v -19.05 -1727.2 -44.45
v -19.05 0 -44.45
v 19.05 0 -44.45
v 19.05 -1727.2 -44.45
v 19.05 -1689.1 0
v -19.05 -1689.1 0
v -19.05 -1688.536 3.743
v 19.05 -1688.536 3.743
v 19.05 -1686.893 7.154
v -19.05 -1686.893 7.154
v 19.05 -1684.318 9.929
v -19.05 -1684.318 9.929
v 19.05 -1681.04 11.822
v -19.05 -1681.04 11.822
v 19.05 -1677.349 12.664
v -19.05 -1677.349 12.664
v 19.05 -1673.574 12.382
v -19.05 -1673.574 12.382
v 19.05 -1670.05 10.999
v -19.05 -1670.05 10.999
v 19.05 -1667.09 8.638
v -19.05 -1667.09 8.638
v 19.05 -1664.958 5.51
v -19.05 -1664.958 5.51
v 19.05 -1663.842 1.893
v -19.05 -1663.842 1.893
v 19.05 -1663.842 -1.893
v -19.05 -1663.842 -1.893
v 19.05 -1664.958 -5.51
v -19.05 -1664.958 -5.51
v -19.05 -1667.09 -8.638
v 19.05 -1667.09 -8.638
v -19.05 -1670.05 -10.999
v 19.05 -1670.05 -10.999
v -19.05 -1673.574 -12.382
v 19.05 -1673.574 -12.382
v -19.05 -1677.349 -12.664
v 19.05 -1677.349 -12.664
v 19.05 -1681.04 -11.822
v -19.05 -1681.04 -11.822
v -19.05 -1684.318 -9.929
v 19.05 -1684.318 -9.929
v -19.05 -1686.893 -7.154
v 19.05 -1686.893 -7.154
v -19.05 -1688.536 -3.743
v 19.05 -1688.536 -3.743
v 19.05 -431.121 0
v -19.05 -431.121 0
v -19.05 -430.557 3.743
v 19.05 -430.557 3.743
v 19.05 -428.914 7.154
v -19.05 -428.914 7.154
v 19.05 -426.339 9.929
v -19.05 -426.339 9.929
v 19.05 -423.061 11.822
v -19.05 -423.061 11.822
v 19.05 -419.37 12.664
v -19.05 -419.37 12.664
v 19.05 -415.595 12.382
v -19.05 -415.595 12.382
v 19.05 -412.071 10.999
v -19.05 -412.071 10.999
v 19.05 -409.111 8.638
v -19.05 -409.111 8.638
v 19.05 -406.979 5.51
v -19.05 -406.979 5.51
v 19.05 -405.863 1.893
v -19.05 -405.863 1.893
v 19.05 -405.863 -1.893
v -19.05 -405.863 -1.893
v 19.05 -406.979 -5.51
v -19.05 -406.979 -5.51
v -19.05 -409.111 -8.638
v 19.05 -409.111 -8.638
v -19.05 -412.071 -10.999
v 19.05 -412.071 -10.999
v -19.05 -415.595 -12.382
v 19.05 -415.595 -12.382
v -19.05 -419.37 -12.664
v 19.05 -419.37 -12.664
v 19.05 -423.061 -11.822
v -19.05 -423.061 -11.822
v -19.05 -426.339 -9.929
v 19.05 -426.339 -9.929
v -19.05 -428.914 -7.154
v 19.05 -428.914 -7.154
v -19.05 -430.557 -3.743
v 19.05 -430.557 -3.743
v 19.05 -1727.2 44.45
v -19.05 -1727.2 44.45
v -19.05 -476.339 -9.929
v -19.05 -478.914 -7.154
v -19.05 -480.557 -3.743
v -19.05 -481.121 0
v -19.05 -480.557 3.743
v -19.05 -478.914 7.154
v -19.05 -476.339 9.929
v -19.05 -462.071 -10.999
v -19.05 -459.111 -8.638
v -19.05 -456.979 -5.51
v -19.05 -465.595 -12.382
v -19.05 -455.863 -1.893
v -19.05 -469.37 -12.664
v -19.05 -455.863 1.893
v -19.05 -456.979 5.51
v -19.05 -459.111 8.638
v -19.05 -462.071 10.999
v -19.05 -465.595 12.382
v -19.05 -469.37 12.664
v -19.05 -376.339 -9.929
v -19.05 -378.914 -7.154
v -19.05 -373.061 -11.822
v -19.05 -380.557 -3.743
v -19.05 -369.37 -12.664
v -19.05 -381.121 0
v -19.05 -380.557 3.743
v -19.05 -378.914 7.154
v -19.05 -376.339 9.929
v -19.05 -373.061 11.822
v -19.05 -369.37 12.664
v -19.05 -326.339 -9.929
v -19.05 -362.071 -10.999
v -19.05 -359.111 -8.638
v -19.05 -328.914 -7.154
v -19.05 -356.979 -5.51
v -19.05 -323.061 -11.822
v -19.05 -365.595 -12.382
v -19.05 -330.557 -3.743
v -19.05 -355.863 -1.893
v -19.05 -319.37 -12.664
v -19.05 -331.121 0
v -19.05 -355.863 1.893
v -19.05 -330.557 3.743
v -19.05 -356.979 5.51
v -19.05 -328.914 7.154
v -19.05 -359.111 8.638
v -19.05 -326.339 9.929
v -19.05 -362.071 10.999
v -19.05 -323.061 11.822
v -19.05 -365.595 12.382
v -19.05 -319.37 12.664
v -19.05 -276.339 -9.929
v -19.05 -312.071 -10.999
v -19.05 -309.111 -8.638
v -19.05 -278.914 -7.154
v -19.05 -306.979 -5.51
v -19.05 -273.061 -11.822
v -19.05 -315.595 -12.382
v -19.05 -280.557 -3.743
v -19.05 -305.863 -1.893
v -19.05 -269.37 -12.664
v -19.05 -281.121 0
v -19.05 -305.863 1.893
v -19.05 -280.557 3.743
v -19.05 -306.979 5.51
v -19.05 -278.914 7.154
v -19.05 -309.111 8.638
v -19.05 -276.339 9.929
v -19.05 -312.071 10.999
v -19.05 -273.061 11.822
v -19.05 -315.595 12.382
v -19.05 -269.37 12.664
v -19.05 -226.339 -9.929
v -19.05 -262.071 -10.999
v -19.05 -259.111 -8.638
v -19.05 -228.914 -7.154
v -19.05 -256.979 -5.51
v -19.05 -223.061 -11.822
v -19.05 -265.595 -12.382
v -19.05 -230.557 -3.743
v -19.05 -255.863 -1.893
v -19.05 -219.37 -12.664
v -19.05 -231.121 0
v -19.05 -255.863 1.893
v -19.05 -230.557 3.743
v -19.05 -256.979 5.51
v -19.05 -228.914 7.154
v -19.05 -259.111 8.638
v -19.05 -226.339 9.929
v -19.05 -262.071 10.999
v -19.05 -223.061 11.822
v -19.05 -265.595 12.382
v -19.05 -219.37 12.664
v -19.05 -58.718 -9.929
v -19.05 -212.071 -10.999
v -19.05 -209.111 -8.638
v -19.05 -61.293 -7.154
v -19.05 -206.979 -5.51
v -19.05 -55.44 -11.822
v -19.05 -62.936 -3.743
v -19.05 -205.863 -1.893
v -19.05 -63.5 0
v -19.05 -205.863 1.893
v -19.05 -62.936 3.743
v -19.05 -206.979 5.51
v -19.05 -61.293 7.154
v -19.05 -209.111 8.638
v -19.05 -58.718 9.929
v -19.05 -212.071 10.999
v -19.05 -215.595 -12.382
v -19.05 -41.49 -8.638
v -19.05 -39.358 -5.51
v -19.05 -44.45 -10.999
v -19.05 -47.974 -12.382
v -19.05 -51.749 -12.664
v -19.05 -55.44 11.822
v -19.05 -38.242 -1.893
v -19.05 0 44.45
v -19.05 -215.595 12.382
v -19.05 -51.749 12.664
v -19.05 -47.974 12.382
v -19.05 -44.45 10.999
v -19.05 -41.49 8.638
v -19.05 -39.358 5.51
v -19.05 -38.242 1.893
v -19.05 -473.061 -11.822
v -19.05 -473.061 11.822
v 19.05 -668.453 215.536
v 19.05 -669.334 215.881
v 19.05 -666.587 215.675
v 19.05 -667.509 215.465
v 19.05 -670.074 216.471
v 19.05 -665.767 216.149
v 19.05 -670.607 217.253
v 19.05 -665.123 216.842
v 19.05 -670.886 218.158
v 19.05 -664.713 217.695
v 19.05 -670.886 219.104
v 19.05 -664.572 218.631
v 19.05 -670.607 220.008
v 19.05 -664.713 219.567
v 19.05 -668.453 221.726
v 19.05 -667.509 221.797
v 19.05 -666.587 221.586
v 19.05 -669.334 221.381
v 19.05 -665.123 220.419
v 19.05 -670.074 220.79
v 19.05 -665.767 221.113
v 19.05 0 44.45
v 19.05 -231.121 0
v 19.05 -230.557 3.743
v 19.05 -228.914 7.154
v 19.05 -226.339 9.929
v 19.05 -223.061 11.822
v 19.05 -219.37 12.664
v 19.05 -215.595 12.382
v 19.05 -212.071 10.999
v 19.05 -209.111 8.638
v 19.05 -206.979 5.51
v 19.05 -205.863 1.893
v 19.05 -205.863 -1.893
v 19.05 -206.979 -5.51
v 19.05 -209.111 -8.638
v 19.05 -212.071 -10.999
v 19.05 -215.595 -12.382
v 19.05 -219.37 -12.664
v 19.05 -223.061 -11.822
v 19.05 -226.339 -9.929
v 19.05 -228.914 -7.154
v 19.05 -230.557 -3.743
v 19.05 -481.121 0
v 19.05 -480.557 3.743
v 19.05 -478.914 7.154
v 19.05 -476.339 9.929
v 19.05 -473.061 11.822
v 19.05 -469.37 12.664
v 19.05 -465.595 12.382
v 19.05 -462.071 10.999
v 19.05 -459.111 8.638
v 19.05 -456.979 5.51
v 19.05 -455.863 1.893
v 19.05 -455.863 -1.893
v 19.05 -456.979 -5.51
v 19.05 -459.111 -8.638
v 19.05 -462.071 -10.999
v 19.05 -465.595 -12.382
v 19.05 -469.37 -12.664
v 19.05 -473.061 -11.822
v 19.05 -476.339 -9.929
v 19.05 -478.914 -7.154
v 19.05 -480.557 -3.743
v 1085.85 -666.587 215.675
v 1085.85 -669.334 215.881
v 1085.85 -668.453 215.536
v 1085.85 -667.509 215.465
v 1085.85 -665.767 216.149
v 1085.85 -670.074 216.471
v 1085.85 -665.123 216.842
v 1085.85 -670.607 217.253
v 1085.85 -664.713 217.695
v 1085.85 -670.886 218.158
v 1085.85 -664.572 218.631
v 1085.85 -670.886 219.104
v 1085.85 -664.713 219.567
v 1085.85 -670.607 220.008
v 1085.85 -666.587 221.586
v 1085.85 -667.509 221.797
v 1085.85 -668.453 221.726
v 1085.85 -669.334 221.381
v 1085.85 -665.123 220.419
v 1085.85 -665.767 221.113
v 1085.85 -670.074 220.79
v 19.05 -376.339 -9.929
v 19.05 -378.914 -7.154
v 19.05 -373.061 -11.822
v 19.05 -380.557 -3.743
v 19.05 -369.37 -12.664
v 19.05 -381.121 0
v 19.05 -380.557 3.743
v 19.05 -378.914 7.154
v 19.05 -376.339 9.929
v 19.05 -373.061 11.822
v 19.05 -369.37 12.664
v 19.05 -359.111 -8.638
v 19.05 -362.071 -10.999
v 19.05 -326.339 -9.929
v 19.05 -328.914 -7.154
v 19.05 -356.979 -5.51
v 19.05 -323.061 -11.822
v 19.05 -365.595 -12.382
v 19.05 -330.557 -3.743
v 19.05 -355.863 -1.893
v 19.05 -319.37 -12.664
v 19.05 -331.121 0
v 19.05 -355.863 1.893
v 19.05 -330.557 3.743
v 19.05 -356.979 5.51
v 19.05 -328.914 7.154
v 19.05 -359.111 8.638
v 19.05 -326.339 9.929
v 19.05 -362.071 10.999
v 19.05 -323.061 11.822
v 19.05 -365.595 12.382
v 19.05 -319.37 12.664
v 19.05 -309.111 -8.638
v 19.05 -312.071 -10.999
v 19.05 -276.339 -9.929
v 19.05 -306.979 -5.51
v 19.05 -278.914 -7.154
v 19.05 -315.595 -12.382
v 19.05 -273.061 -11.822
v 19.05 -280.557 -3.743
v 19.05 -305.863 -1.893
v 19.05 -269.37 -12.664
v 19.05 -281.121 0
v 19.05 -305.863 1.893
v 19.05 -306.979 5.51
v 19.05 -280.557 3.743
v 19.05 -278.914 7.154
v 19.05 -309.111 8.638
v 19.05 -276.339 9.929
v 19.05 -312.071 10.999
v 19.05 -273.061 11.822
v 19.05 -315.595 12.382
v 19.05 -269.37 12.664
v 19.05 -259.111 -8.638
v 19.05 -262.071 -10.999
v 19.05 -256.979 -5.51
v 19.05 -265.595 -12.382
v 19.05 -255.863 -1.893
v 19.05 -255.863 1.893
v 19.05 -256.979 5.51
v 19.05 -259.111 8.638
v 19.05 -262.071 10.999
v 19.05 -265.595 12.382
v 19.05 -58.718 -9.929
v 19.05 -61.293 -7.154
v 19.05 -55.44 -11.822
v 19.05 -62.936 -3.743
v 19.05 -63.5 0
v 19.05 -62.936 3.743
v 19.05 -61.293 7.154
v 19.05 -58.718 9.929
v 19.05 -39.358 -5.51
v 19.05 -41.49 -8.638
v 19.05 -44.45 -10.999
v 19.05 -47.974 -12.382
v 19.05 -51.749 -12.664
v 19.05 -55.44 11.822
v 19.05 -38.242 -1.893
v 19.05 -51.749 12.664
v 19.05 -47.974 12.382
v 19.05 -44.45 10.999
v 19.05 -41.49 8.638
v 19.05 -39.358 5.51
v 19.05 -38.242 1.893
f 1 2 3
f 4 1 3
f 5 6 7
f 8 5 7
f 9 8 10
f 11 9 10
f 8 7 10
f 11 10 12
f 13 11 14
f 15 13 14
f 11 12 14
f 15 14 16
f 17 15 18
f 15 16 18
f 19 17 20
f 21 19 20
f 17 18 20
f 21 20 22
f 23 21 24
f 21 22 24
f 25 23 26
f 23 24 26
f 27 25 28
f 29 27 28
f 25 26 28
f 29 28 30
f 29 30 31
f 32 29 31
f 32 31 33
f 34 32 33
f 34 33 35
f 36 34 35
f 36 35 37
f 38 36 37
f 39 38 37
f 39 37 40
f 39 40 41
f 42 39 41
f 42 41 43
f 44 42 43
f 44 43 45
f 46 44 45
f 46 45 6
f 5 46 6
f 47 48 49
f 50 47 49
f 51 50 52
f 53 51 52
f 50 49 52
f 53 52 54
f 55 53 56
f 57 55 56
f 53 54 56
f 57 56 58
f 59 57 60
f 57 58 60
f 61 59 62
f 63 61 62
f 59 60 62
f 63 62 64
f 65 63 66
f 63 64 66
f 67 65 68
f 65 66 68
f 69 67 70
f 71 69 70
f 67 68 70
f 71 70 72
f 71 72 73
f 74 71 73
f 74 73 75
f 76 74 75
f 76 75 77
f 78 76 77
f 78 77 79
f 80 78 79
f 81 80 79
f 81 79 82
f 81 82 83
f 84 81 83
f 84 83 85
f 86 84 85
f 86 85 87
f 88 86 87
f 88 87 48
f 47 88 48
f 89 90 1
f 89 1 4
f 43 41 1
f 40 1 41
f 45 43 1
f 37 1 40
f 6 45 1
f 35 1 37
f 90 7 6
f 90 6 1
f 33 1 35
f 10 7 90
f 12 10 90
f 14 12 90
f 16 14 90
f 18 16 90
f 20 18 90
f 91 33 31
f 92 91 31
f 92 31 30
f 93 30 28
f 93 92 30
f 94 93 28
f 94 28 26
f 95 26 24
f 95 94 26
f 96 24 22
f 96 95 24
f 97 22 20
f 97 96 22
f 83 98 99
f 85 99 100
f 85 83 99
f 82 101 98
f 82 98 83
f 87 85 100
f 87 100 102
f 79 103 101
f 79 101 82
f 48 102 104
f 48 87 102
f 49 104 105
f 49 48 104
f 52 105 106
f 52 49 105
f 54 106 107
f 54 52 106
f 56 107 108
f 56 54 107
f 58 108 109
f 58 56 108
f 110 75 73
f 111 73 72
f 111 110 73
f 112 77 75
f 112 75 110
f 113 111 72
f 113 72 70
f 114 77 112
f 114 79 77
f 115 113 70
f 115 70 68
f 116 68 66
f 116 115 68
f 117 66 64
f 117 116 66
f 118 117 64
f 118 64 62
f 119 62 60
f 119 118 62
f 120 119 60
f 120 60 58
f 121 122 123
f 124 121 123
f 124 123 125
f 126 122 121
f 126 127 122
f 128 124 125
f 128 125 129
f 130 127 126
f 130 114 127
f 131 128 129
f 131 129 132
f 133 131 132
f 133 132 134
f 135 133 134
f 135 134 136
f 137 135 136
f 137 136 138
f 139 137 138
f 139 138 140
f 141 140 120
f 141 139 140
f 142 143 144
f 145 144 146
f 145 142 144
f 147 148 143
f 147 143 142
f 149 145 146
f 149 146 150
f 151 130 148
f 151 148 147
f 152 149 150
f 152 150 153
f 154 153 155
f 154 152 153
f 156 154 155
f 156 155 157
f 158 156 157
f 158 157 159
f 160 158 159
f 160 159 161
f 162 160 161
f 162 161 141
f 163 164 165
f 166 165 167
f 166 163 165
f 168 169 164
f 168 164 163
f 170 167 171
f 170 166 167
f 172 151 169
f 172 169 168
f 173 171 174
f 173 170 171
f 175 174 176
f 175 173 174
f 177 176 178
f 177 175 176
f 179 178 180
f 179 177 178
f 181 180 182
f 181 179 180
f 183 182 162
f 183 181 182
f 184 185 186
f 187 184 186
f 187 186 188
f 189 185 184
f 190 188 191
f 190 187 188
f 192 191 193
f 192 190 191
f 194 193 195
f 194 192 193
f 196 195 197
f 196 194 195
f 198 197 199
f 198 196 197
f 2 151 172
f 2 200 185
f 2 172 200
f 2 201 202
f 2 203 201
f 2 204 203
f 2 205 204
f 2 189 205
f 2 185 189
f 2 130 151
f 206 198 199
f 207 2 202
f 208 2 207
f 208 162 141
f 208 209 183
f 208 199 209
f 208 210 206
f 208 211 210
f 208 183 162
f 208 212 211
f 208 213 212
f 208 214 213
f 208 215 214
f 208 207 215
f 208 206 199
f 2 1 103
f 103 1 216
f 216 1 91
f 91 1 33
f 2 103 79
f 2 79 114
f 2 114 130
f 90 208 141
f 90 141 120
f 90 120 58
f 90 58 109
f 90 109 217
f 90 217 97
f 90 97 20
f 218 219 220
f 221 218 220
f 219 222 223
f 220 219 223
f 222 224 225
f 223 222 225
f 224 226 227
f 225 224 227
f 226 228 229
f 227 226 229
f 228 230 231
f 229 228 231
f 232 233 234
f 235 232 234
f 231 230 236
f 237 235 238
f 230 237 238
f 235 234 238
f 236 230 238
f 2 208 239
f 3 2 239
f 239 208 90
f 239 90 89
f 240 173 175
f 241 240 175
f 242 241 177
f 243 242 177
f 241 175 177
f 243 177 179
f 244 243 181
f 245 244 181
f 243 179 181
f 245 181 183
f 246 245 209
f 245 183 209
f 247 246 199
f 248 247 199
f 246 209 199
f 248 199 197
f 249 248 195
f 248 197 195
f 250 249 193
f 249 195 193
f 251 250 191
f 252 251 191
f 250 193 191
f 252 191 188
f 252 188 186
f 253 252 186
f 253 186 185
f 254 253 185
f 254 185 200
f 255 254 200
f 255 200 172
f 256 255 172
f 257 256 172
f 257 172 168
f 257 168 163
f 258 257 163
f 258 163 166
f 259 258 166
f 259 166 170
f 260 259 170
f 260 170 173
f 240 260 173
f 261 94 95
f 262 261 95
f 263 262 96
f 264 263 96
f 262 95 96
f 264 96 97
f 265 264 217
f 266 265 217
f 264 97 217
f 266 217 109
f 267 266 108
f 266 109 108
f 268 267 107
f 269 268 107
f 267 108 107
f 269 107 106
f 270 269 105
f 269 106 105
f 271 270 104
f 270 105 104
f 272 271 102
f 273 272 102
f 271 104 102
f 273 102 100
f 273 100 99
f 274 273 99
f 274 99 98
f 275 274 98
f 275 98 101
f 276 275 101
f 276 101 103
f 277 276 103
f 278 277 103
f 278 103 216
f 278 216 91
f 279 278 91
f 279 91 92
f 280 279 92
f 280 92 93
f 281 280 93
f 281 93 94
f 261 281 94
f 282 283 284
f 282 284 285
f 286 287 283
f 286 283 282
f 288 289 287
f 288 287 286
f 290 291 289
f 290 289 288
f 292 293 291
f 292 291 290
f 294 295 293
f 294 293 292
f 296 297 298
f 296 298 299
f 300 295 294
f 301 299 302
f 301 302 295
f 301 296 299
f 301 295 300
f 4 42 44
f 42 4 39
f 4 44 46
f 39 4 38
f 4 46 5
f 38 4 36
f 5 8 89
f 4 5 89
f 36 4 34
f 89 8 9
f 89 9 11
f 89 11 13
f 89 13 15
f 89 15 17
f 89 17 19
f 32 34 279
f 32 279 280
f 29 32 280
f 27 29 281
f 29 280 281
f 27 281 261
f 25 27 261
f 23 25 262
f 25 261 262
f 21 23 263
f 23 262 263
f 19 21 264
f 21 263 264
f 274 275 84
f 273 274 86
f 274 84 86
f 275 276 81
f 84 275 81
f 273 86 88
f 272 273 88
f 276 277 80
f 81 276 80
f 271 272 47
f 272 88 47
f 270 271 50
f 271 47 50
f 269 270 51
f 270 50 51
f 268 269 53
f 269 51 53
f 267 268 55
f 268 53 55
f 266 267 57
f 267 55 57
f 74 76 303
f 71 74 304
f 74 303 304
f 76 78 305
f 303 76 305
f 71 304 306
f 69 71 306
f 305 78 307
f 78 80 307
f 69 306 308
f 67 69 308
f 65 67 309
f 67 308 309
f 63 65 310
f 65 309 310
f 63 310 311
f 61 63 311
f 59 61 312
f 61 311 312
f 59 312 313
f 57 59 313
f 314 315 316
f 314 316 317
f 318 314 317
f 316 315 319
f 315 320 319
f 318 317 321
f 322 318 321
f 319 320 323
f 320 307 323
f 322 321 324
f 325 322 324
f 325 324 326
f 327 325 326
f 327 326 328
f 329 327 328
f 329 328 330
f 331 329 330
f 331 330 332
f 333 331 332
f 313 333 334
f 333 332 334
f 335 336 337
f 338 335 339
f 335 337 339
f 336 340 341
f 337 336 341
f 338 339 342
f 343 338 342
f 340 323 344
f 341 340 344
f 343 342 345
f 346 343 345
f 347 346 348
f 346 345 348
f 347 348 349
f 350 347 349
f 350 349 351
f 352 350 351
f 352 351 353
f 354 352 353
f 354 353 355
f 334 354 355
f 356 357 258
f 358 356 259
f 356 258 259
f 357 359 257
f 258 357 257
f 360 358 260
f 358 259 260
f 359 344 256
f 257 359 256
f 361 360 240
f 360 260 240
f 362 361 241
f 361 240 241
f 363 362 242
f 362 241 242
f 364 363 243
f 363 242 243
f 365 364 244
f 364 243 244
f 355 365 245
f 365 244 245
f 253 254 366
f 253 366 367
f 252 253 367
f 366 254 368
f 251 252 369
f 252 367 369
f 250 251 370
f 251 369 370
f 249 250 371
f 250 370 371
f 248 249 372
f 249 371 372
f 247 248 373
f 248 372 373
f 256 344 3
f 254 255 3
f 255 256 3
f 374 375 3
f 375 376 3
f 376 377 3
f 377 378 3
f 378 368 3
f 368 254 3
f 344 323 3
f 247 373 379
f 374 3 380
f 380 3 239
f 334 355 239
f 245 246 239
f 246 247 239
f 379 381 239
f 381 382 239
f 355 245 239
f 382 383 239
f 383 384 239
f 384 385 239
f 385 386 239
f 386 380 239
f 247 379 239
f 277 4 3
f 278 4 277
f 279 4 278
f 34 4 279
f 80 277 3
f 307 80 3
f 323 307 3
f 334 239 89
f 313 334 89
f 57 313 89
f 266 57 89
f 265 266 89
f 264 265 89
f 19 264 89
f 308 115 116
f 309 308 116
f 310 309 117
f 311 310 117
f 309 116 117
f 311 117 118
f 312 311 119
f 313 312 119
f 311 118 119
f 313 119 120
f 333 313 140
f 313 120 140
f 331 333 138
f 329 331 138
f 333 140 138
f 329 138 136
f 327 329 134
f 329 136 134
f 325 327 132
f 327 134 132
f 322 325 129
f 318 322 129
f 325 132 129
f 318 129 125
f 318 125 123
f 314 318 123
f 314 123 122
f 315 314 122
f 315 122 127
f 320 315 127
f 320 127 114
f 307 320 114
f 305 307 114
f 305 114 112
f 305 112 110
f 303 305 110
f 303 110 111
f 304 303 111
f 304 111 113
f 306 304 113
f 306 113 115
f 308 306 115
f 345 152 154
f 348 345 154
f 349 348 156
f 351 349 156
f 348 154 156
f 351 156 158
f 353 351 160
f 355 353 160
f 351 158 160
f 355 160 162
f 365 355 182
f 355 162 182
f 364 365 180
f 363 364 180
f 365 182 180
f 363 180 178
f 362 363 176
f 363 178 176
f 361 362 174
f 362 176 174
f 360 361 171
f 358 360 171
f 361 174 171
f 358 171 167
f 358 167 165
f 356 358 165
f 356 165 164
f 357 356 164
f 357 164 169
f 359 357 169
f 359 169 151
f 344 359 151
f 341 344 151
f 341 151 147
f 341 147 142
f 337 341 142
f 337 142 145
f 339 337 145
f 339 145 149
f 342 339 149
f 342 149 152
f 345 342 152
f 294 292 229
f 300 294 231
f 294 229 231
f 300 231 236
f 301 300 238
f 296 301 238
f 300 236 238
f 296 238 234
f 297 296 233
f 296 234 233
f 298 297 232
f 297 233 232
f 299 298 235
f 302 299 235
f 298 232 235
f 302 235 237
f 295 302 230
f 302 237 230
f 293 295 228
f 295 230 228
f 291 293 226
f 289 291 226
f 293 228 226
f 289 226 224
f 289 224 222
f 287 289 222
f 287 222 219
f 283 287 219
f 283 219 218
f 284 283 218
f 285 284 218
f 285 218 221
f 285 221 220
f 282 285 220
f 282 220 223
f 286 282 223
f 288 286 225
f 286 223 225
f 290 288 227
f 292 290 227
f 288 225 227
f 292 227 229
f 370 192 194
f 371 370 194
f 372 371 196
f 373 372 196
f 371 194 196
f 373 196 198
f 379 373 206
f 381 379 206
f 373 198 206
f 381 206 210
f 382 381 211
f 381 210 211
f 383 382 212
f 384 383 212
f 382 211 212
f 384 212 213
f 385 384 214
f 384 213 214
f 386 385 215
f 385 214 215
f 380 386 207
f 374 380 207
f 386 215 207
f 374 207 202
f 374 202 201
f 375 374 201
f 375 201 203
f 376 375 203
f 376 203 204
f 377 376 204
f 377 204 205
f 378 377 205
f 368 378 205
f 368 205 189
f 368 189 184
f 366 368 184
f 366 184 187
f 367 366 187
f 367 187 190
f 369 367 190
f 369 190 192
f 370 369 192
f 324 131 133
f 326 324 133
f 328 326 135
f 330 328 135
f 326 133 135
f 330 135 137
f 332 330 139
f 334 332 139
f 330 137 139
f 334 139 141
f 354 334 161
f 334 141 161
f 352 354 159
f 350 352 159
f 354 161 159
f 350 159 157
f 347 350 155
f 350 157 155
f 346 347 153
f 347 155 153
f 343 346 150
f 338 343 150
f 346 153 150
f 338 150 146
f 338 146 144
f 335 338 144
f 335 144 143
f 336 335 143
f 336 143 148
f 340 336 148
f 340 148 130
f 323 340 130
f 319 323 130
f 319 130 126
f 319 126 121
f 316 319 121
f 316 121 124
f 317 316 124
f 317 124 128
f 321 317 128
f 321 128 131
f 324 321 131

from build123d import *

# Parameters (mm, degrees)
F0_W     = 38.1
F0_H     = 88.9
F1_DEPTH = 1727.2
F3_D     = 25.4
F4_R     = 3.175
F5_DEPTH = 203.2
F6_DEPTH = 1066.8


# Not quite as in the source:
# - a feature names something its author has since deleted; it is built from what else it names


with BuildPart() as f1:
    # F0 (on Front) → F1 (new body)
    with BuildSketch(Plane.XZ):
        Rectangle(F0_W, F0_H)
    extrude(amount=F1_DEPTH)

    # F3 (through all)
    with Locations(Plane.YZ.offset(19.05)):
        with Locations((-468.4210526316, 0), (-418.4210526316, 0), (-368.4210526316, 0), (-318.4210526316, 0), (-50.8, 0), (-1676.4, 0), (-268.4210526316, 0), (-218.4210526316, 0)):
            Hole(F3_D / 2)


with BuildPart() as f5:
    # F4 (on face) → F5 (new body)
    with BuildSketch(Plane.YZ.offset(19.05)):
        with Locations((-1066.8073892593, 218.6309099197)):
            Circle(F4_R)
    extrude(amount=-F5_DEPTH)


with BuildPart() as f6:
    # F4 (on face) → F6 (new body)
    with BuildSketch(Plane.YZ.offset(19.05)):
        with Locations((-667.7466630936, 218.6309099197)):
            Circle(F4_R)
    extrude(amount=F6_DEPTH)


solid = Compound([f1.part, f6.part])
